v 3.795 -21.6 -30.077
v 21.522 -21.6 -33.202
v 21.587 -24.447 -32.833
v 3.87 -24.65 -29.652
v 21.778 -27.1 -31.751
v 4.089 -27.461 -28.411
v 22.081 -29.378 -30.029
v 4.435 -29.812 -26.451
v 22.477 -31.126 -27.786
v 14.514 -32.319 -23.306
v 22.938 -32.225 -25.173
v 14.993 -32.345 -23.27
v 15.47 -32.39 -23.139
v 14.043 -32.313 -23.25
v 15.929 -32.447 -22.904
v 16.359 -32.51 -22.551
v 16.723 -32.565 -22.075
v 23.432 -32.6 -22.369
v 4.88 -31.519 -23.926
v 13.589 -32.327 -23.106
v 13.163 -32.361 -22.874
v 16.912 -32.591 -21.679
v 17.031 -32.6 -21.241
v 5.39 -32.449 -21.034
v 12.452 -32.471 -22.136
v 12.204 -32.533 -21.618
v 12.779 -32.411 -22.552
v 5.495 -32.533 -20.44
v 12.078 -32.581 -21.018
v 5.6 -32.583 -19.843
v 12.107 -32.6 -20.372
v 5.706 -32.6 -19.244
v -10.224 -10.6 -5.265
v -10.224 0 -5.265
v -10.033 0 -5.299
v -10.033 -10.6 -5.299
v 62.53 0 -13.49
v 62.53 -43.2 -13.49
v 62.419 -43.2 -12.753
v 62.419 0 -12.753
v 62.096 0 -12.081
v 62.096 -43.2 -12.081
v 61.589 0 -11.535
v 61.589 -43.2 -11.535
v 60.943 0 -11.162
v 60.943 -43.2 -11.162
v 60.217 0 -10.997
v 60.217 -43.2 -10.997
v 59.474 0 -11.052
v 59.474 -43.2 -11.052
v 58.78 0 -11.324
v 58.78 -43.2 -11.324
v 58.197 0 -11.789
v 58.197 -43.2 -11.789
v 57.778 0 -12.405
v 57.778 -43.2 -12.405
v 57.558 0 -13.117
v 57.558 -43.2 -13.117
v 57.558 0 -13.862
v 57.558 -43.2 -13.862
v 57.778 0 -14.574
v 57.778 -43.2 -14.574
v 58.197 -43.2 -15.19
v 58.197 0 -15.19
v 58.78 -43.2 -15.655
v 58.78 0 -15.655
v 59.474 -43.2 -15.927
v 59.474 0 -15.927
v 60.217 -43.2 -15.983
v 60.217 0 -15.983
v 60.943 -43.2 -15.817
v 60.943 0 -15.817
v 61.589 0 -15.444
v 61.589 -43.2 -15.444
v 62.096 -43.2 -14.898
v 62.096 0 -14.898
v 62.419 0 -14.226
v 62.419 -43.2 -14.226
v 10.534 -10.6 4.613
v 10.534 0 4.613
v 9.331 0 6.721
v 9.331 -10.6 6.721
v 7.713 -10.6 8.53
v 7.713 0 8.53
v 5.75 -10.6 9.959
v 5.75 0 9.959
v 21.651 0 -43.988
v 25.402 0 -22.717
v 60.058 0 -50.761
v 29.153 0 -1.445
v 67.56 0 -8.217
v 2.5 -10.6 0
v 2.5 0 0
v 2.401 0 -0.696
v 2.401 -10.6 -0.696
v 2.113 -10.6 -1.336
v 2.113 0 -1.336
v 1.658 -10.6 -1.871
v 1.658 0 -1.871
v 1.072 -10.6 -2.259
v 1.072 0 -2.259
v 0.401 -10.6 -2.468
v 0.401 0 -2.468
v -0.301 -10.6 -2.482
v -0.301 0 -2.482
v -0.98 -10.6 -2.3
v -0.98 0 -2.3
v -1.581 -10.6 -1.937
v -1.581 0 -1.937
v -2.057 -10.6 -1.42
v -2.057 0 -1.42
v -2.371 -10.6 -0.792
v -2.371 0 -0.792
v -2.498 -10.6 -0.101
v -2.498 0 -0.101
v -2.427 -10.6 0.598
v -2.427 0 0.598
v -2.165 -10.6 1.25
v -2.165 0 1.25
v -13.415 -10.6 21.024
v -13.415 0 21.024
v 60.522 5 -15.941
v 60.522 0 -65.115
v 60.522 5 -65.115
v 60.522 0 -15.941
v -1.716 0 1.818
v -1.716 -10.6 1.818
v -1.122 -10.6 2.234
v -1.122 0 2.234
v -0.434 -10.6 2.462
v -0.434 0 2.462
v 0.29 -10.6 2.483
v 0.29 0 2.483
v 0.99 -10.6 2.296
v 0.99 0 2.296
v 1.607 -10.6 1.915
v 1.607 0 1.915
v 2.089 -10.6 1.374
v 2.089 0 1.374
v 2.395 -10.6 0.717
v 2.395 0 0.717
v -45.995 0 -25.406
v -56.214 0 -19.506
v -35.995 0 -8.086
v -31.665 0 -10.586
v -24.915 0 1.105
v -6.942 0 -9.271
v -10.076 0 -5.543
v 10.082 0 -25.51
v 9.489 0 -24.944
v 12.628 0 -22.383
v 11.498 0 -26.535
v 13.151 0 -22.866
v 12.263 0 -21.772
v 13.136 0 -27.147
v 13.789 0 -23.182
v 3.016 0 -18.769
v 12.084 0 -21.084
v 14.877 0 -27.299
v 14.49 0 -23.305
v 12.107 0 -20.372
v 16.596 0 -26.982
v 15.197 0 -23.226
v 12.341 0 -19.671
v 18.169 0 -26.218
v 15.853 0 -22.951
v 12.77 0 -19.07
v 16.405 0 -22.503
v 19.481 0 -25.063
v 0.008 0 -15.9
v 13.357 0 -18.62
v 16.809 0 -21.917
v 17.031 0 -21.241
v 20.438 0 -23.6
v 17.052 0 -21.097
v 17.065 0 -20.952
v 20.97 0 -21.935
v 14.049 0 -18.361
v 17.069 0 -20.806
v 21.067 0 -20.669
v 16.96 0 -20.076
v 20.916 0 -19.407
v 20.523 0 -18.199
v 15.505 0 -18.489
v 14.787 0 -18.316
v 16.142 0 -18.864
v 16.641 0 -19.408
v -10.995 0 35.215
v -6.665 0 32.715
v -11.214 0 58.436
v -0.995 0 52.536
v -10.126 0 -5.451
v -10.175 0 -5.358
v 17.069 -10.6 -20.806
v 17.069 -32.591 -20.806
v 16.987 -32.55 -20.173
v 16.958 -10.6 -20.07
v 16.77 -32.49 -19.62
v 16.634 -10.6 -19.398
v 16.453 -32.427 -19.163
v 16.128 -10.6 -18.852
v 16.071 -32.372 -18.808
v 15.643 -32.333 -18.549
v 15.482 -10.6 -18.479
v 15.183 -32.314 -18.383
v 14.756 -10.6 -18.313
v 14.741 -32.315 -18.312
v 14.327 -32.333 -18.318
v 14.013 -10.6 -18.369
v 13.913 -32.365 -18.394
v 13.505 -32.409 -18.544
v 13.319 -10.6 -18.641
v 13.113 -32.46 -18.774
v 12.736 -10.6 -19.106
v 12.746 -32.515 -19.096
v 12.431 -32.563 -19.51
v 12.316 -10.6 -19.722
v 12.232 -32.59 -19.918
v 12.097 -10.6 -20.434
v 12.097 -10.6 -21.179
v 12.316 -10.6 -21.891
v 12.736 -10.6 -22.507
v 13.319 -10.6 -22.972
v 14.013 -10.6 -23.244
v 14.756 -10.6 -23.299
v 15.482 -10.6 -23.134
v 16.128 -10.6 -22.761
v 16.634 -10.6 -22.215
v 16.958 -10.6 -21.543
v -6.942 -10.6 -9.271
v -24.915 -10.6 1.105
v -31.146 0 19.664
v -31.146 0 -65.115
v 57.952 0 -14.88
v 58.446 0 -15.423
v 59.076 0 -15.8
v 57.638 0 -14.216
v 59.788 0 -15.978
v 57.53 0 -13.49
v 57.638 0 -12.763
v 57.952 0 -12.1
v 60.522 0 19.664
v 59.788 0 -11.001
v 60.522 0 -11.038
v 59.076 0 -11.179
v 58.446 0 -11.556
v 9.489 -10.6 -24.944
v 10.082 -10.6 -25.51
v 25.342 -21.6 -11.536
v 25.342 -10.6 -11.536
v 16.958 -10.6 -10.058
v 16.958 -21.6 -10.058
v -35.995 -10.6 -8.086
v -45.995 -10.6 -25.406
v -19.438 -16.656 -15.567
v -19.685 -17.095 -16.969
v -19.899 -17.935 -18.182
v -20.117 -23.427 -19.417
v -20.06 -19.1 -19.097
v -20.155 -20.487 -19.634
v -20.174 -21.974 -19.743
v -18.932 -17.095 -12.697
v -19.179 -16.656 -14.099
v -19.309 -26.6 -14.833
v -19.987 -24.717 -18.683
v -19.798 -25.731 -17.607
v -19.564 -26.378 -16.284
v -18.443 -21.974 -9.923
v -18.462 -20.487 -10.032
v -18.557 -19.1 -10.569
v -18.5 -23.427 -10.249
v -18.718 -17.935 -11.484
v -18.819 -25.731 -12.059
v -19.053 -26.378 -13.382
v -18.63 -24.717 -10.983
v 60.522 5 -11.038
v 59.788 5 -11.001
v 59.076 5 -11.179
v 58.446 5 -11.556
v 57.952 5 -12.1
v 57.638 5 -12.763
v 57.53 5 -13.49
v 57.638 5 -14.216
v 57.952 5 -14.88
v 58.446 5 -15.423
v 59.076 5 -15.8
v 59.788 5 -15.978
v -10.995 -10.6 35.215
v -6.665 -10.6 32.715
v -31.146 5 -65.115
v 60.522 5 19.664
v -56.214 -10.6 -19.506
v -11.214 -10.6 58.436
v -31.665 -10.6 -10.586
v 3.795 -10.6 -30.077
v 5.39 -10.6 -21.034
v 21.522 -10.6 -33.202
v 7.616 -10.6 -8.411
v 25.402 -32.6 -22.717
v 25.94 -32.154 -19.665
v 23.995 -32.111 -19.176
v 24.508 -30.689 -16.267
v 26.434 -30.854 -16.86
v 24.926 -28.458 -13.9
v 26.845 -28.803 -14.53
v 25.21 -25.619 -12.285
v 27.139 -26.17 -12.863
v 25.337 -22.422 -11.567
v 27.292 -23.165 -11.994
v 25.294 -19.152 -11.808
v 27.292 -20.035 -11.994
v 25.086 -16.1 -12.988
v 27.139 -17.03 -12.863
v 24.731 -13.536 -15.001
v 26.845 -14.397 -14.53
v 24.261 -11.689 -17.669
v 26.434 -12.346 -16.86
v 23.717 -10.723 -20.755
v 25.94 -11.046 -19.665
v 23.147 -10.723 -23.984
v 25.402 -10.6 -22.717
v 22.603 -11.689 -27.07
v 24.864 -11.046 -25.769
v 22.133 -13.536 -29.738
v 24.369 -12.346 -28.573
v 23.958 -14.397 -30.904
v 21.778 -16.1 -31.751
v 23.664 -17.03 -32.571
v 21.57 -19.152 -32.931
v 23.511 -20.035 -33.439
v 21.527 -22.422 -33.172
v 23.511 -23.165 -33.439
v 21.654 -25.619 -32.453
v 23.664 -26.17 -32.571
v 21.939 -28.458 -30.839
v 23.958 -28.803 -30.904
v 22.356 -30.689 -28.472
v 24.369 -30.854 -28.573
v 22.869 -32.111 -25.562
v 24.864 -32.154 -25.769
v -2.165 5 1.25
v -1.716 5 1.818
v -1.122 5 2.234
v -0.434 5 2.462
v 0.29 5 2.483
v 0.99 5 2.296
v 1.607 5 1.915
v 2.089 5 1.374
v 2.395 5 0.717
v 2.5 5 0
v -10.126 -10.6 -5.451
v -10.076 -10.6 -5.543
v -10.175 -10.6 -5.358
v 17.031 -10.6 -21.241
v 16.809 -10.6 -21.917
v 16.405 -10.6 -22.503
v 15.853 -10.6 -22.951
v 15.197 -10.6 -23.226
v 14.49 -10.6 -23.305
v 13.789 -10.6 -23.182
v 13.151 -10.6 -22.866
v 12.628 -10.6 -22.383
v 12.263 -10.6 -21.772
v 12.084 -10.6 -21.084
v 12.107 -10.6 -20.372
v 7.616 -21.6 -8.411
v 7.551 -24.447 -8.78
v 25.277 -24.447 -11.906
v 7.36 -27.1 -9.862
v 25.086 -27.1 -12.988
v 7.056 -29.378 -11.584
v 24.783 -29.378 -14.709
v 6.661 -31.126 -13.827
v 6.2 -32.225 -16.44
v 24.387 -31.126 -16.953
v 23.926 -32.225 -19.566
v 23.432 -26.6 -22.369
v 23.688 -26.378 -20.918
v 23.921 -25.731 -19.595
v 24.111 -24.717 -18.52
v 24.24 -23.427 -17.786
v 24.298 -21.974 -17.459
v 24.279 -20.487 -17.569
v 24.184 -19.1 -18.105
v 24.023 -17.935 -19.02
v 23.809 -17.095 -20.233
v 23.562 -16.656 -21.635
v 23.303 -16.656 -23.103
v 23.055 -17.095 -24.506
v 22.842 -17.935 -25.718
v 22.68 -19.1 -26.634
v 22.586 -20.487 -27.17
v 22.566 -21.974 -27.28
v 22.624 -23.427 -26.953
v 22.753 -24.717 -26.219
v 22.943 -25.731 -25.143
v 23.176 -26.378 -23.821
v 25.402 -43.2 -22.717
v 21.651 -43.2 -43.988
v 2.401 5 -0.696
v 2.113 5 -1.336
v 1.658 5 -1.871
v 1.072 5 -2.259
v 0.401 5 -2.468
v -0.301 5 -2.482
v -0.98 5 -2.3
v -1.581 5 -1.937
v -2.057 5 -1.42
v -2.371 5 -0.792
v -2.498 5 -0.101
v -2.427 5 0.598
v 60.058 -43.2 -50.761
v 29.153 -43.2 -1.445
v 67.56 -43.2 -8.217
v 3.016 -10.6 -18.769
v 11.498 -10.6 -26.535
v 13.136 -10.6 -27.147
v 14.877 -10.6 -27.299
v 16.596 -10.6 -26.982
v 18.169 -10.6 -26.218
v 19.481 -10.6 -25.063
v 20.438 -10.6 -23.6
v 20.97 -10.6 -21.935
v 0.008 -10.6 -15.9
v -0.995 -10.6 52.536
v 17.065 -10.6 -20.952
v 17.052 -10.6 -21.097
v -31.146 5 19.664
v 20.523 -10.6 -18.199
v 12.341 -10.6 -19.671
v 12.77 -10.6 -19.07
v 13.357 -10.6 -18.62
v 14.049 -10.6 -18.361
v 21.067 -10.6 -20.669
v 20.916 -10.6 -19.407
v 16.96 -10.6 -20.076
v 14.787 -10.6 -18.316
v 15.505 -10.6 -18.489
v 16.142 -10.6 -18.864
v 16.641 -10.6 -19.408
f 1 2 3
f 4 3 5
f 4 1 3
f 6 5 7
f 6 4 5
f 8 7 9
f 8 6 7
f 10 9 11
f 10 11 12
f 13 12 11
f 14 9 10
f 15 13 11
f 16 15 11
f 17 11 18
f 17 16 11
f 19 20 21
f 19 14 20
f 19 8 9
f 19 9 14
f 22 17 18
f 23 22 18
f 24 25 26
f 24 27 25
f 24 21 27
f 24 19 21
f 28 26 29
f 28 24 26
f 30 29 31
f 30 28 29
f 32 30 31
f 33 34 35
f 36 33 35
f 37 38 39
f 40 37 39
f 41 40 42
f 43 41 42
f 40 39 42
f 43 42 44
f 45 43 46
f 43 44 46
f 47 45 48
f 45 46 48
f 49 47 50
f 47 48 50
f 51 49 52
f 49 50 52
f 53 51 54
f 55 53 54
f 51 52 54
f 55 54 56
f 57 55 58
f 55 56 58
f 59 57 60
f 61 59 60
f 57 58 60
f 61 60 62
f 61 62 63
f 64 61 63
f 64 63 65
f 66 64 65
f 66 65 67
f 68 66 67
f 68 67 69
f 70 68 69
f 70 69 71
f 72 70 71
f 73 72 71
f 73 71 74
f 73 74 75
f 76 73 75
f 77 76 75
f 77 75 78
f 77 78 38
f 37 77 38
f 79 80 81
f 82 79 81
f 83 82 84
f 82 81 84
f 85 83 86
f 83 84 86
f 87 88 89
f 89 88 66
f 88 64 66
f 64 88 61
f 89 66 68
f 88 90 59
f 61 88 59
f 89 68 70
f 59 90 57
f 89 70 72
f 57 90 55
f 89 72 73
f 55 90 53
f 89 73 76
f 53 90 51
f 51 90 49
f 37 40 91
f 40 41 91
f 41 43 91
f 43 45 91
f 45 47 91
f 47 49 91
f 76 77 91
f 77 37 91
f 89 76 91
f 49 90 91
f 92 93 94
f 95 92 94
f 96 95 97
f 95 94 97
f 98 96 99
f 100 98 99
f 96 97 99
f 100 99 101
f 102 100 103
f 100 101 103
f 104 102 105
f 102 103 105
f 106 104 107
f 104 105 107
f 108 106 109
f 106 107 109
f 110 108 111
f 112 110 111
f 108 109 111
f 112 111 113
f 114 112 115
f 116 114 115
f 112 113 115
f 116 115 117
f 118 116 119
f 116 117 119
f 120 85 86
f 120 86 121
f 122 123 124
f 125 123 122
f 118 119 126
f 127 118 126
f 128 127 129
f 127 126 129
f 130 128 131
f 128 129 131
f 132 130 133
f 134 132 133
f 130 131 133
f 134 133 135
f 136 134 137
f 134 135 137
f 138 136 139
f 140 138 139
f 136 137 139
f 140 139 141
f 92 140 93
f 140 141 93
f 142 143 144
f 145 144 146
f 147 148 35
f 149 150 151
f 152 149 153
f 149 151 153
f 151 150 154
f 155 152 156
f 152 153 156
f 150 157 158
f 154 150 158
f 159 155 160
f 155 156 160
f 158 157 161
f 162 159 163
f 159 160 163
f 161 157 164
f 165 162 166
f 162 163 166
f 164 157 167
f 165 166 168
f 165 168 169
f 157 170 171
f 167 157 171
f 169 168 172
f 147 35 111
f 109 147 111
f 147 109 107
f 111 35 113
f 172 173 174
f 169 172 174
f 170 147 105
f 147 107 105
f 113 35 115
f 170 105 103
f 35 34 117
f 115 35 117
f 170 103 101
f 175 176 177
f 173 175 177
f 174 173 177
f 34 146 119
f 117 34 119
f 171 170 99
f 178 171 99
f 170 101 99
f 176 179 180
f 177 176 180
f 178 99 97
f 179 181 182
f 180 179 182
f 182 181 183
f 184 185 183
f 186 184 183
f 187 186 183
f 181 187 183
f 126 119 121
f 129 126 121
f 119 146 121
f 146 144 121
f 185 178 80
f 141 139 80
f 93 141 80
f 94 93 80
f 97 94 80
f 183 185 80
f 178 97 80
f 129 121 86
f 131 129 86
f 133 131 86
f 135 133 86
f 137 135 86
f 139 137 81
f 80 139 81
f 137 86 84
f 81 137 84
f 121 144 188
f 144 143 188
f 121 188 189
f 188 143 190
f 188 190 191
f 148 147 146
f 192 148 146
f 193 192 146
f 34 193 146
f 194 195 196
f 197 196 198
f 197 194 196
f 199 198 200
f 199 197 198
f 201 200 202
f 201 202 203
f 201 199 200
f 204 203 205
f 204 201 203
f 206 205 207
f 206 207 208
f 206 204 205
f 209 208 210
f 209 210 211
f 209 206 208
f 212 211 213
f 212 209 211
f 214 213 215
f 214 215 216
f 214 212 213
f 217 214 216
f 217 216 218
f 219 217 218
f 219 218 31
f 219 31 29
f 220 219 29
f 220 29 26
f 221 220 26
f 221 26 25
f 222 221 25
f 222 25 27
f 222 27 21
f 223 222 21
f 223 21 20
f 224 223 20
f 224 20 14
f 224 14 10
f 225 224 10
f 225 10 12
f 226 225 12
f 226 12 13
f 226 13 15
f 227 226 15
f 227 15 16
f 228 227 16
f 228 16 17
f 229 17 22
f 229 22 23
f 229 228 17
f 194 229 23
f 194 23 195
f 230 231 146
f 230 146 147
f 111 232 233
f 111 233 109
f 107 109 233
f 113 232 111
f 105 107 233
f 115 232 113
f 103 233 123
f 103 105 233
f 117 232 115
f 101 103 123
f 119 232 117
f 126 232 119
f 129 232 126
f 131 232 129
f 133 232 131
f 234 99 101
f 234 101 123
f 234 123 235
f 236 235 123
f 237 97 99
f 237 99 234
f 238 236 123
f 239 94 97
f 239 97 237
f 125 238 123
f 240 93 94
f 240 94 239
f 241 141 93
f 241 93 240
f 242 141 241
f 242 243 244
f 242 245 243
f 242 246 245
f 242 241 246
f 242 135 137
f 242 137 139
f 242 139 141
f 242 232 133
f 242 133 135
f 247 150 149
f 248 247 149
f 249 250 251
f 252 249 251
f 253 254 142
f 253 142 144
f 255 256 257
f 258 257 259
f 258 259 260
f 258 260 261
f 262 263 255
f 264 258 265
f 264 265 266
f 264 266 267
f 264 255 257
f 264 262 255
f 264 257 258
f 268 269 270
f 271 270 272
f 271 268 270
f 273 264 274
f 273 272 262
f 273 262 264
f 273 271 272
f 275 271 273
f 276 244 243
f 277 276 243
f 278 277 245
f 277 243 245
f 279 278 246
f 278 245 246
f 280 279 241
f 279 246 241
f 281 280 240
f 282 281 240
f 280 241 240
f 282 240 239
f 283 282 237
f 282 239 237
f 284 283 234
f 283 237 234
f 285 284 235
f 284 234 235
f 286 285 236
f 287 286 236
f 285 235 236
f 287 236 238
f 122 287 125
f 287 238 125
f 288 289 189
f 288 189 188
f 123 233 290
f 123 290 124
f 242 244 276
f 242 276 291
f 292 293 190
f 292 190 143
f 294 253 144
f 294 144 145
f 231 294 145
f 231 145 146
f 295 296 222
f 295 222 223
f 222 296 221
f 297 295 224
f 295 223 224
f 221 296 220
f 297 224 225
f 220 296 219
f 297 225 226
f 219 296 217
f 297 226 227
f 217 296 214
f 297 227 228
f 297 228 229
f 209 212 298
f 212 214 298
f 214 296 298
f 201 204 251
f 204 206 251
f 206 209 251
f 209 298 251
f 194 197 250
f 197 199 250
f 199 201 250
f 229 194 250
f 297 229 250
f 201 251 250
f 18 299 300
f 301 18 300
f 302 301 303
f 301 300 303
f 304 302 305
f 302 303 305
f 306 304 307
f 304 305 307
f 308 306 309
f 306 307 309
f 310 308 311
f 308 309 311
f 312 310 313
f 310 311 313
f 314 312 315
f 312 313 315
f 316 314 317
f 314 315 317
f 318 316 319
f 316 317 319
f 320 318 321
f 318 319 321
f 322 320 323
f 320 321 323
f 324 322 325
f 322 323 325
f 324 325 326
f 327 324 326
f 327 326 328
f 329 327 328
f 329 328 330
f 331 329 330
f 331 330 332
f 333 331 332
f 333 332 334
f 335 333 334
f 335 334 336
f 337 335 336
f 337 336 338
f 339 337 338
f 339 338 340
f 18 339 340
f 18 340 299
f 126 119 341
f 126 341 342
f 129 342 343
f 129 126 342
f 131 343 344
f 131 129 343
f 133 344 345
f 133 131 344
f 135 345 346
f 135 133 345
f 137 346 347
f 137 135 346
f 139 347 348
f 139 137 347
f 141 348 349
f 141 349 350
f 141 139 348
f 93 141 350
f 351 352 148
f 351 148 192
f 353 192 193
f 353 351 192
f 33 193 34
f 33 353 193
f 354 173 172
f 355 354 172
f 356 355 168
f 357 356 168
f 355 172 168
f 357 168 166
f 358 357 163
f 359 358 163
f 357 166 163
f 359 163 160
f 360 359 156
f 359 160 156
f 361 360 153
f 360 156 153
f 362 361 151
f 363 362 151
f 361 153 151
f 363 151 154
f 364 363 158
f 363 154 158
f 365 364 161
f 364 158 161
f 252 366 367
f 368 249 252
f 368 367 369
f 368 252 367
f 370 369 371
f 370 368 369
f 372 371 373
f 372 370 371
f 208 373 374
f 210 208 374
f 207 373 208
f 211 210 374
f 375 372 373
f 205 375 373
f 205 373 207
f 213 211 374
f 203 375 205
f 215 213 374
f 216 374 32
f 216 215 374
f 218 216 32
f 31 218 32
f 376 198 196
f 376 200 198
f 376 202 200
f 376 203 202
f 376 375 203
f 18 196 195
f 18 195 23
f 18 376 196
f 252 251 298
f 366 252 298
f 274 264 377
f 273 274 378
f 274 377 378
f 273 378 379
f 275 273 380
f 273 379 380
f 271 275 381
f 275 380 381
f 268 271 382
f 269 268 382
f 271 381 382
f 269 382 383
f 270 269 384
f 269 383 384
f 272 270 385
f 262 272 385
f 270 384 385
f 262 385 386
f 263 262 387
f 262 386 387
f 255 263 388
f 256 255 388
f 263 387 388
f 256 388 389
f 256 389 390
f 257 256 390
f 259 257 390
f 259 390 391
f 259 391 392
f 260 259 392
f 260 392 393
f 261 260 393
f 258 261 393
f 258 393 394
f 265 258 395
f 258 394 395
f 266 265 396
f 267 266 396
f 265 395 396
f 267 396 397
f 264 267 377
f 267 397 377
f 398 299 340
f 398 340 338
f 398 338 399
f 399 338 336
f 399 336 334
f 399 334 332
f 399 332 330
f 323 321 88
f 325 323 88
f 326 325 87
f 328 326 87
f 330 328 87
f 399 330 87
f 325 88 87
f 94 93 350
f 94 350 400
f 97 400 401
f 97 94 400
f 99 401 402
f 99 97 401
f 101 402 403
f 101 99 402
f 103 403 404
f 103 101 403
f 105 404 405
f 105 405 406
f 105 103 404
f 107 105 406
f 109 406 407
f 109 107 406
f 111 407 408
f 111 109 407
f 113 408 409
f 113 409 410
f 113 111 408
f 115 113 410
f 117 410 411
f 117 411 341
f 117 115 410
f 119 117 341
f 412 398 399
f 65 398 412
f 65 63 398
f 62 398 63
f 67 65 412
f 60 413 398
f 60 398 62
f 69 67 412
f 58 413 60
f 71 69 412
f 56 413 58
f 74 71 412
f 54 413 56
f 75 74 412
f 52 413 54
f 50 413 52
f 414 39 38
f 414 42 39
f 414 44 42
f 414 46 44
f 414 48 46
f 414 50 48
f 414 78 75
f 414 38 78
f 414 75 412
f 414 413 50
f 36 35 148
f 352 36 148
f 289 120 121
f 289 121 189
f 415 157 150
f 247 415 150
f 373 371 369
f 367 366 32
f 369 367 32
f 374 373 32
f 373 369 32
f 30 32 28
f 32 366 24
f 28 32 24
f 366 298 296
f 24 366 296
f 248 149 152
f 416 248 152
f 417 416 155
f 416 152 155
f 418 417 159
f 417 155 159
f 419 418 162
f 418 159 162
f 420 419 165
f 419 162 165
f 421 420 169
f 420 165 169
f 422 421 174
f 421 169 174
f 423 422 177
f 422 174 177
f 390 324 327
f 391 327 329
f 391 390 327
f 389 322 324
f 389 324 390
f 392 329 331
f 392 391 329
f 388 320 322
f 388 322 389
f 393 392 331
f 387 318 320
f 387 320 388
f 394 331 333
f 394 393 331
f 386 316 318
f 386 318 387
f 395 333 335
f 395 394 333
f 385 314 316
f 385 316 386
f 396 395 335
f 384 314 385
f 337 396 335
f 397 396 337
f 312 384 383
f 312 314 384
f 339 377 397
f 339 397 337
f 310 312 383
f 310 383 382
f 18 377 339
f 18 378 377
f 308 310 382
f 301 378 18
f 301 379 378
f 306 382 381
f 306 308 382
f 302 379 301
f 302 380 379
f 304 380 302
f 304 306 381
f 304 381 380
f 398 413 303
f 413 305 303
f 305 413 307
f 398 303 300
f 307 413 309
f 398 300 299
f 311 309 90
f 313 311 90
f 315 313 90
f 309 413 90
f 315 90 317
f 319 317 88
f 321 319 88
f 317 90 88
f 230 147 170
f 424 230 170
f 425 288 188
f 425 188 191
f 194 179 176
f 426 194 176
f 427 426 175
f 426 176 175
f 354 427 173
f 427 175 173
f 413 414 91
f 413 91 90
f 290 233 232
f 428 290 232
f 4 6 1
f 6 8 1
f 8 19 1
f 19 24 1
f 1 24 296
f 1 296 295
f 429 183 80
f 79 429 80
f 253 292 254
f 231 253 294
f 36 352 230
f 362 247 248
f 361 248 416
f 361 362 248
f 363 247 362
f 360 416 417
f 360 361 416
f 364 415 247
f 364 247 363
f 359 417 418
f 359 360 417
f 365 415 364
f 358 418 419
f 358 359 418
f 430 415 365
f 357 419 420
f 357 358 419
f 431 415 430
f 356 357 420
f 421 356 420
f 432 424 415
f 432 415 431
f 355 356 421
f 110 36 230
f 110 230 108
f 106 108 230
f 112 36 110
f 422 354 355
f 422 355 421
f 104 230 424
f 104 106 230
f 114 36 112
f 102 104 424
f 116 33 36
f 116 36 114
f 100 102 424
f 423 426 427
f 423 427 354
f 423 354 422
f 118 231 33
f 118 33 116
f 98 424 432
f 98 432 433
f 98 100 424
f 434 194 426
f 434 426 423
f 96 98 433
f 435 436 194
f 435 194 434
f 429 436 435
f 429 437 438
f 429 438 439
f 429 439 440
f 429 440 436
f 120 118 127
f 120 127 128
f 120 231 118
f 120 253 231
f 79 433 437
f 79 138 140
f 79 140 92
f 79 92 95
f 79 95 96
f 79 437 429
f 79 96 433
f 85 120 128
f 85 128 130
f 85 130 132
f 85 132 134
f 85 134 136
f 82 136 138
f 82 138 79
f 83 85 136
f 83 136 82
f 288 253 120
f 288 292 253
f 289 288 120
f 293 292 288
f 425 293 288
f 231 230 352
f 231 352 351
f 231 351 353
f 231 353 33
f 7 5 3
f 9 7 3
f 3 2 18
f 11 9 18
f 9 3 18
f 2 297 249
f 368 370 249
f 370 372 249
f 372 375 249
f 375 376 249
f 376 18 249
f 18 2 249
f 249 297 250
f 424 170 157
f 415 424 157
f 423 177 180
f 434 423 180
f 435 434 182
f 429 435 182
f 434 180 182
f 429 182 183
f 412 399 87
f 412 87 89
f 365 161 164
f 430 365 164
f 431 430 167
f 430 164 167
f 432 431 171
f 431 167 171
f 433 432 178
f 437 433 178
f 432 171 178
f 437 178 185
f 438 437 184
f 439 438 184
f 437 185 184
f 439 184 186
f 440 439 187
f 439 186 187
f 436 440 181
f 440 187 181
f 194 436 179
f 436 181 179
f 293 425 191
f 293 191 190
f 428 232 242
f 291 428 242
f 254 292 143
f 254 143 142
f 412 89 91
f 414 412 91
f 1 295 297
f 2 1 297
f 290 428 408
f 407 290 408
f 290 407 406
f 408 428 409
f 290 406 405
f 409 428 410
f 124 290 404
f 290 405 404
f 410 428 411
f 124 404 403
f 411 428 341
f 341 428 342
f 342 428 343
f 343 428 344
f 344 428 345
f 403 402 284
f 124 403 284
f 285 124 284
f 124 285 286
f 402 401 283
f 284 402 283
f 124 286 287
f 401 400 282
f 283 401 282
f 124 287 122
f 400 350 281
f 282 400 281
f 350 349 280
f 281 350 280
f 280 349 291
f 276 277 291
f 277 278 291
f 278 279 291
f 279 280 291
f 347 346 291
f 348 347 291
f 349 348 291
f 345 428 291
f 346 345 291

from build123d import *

# Parameters (mm, degrees)
F1_DEPTH    = 10.6
F2_DEPTH    = 43.2
F3_R        = 11
F4_DEPTH    = 2
F5_R        = 5
F6_DEPTH    = 43.4
F7_R        = 2.5
F8_DEPTH    = 22
F9_T1_DEPTH = 73
F9_T3_DEPTH = 73
F10_W       = 91.6676837951
F10_H       = 84.7782492638
F11_DEPTH   = 5
F12_R       = 2.5
F13_DEPTH   = 74.8
F15_DEPTH   = 10.6


# Not quite as in the source:
# - a fillet or chamfer that OpenCascade refuses, or shapes differently, is made with other operations: its cross-section is extruded or revolved along the edge and cut away or added
# - a feature of the source that left no trace in its solid (it failed there, or was rolled back) is left out
# - a feature names something its author has since deleted; it is built from what else it names


with BuildPart() as f1:
    # F0 (on Front) → F1 (new body)
    with BuildSketch(Plane.XZ):
        with BuildLine():
            Line((20.5230552312, -18.1992913043), (10.5343781692, 4.6126864827))
            ThreePointArc((10.5343781692, 4.6126864827), (0.6372216988, 11.4823320152), (-9.9592921435, 5.75))
            ThreePointArc((-9.9592921435, 5.75), (-11.496683076, 0.276185173), (-10.2239091523, -5.2651383312))
            Line((-10.2239091523, -5.2651383312), (-10.0330621935, -5.2987897992))
            Line((-10.0330621935, -5.2987897992), (-10.0760856471, -5.5427879295))
            ThreePointArc((-10.0760856471, -5.5427879295), (-9.1133059009, -7.0141040451), (-7.937476981, -8.3214457383))
            Line((-7.937476981, -8.3214457383), (0.0076867142, -15.9000031098))
            ThreePointArc((0.0076867142, -15.9000031098), (4.1721880916, -16.865197921), (7.4918654025, -19.5586001001))
            Line((7.4918654025, -19.5586001001), (12.1068221008, -20.3723414808))
            ThreePointArc((12.1068221008, -20.3723414808), (14.7867308402, -18.3159751797), (17.0688414833, -20.8064619249))
            ThreePointArc((17.0688414833, -20.8064619249), (17.0593282285, -21.0243512818), (17.0308608658, -21.2405823691))
            Line((17.0308608658, -21.2405823691), (20.9700918779, -21.9351750798))
            ThreePointArc((20.9700918779, -21.9351750798), (21.0227999926, -20.0341798777), (20.5230552312, -18.1992913043))
        make_face()
        with BuildLine():
            ThreePointArc((2.5, 0), (-0.6470476128, -2.4148145657), (-2.1650635095, 1.25))
            ThreePointArc((-2.1650635095, 1.25), (0.6470476128, 2.4148145657), (2.5, 0))
        make_face(mode=Mode.SUBTRACT)
        with BuildLine():
            ThreePointArc((10.0824414506, -25.509887777), (16.5964769767, -26.9821152755), (20.9700918779, -21.9351750798))
            Line((20.9700918779, -21.9351750798), (17.0308608658, -21.2405823691))
            ThreePointArc((17.0308608658, -21.2405823691), (14.1347210391, -23.2684813075), (12.1068221008, -20.3723414808))
            Line((12.1068221008, -20.3723414808), (7.4918654025, -19.5586001001))
            ThreePointArc((7.4918654025, -19.5586001001), (8.9071937501, -22.0966835606), (9.4890434601, -24.9438704))
            Line((9.4890434601, -24.9438704), (10.0824414506, -25.509887777))
        make_face()
        with BuildLine():
            Line((3.0158426859, -18.7693565289), (9.4890434601, -24.9438704))
            ThreePointArc((9.4890434601, -24.9438704), (8.9071937501, -22.0966835606), (7.4918654025, -19.5586001001))
            Line((7.4918654025, -19.5586001001), (3.0158426859, -18.7693565289))
        make_face()
        with BuildLine():
            ThreePointArc((7.4918654025, -19.5586001001), (4.1721880916, -16.865197921), (0.0076867142, -15.9000031098))
            Line((0.0076867142, -15.9000031098), (3.0158426859, -18.7693565289))
            Line((3.0158426859, -18.7693565289), (7.4918654025, -19.5586001001))
        make_face()
    extrude(amount=F1_DEPTH)

    # F14 (on face) → F15 (join)
    with BuildSketch(Plane.XZ.offset(10.6)):
        with BuildLine():
            Line((-31.664557856, -10.5859724576), (-24.914557856, 1.1053704935))
            Line((-24.914557856, 1.1053704935), (-6.941731015, -9.2712459212))
            Line((-6.941731015, -9.2712459212), (-7.937476981, -8.3214457383))
            ThreePointArc((-7.937476981, -8.3214457383), (-9.1133059009, -7.0141040451), (-10.0760856471, -5.5427879295))
            ThreePointArc((-10.0760856471, -5.5427879295), (-10.1509467311, -5.4044685642), (-10.2239091523, -5.2651383312))
            ThreePointArc((-10.2239091523, -5.2651383312), (-11.496683076, 0.276185173), (-9.9592921435, 5.75))
            Line((-9.9592921435, 5.75), (-23.4946848749, 13.564662637))
            Line((-23.4946848749, 13.564662637), (-35.9946848749, -8.0859724576))
            Line((-35.9946848749, -8.0859724576), (-31.664557856, -10.5859724576))
        make_face()
        with BuildLine():
            Line((-17.7446848749, 23.5239547806), (-23.4946848749, 13.564662637))
            Line((-23.4946848749, 13.564662637), (-9.9592921435, 5.75))
            ThreePointArc((-9.9592921435, 5.75), (-2.9764190187, 11.1081470023), (5.75, 9.9592921435))
            Line((5.75, 9.9592921435), (-13.414557856, 21.0239547806))
            Line((-13.414557856, 21.0239547806), (-6.664557856, 32.7152977317))
            Line((-6.664557856, 32.7152977317), (-10.9946848749, 35.2152977317))
            Line((-10.9946848749, 35.2152977317), (-17.7446848749, 23.5239547806))
        make_face()
        Polygon((-41.6238499995, -4.8359724576), (-35.9946848749, -8.0859724576), (-23.4946848749, 13.564662637), (-17.7446848749, 23.5239547806), (-10.9946848749, 35.2152977317), (-16.6238499995, 38.4652977317), align=None)
        Polygon((-45.9946848749, -25.4064805333), (-35.9946848749, -8.0859724576), (-41.6238499995, -4.8359724576), (-16.6238499995, 38.4652977317), (-10.9946848749, 35.2152977317), (-0.9946848749, 52.5358058073), (-11.2137846395, 58.4358058073), (-56.2137846395, -19.5064805333), align=None)
    extrude(amount=-F15_DEPTH)


with BuildPart() as f2:
    # F0 (on Front) → F2 (new body)
    with BuildSketch(Plane.XZ):
        Polygon((29.1525274041, -1.4447444142), (25.4017267665, -22.7165918793), (21.6509261288, -43.9884393443), (60.0584284963, -50.7607182734), (67.5600297715, -8.2170233432), align=None)
    extrude(amount=F2_DEPTH)

    # F3 (on face) → F4 (join)
    with BuildSketch(Plane(origin=(28.5205369873, 0, -5.0289401751), x_dir=(0, -1, 0), z_dir=(-0.984807753, 0, 0.1736481777))):
        with Locations((21.6, -17.9605122421)):
            Circle(F3_R)
    extrude(amount=F4_DEPTH)

    # F5 (on face) → F6 (join)
    with BuildSketch(Plane(origin=(26.5509214812, 0, -4.6816438198), x_dir=(0, -1, 0), z_dir=(-0.984807753, 0, 0.1736481777))):
        with Locations((21.6, -17.9605122421)):
            Circle(F5_R)
    extrude(amount=F6_DEPTH)


with BuildPart() as f8:
    # F7 (on face) → F8 (new body)
    with BuildSketch(Plane.XZ.offset(10.6)):
        with BuildLine():
            Line((3.7954417519, -30.0765136091), (21.5219813061, -33.2021808071))
            Line((21.5219813061, -33.2021808071), (25.3422412148, -11.5364102408))
            Line((25.3422412148, -11.5364102408), (16.9582685695, -10.0580896579))
            Line((16.9582685695, -10.0580896579), (20.5230552312, -18.1992913043))
            ThreePointArc((20.5230552312, -18.1992913043), (18.2970883196, -26.1309502128), (10.0824414506, -25.509887777))
            Line((10.0824414506, -25.509887777), (5.3899032629, -21.0338730293))
            Line((5.3899032629, -21.0338730293), (3.7954417519, -30.0765136091))
        make_face()
        with BuildLine():
            Line((20.5230552312, -18.1992913043), (16.9582685695, -10.0580896579))
            Line((16.9582685695, -10.0580896579), (7.6157016605, -8.4107430428))
            Line((7.6157016605, -8.4107430428), (5.3899032629, -21.0338730293))
            Line((5.3899032629, -21.0338730293), (10.0824414506, -25.509887777))
            ThreePointArc((10.0824414506, -25.509887777), (18.2970883196, -26.1309502128), (20.5230552312, -18.1992913043))
        make_face()
        with Locations((14.5688414833, -20.8064619249)):
            Circle(F7_R, mode=Mode.SUBTRACT)
    extrude(amount=F8_DEPTH)

    # F9: fillet of radius 11 on 2 edges, made by hand

    # F9_s2 → F9_t1 (cut)
    with BuildSketch(Plane(origin=(53.6331346891, 0, -9.4569687057), x_dir=(0, 1, 0), z_dir=(-0.984807753, 0, 0.1736481777))):
        with BuildLine():
            ThreePointArc((-21.6, 6.9605122421), (-29.3781745931, 10.1823376491), (-32.6, 17.9605122421))
            Line((-32.6, 17.9605122421), (-32.6, 6.9605122421))
            Line((-32.6, 6.9605122421), (-21.6, 6.9605122421))
        make_face()
    extrude(amount=F9_T1_DEPTH, mode=Mode.SUBTRACT)

    # F9_s4 → F9_t3 (cut)
    with BuildSketch(Plane(origin=(-18.2578312808, 0, 3.219348264), x_dir=(0, 1, 0), z_dir=(0.984807753, 0, -0.1736481777))):
        with BuildLine():
            ThreePointArc((-21.6, -28.9605122421), (-29.3781745931, -25.7386868352), (-32.6, -17.9605122421))
            Line((-32.6, -17.9605122421), (-32.6, -28.9605122421))
            Line((-32.6, -28.9605122421), (-21.6, -28.9605122421))
        make_face()
    extrude(amount=F9_T3_DEPTH, mode=Mode.SUBTRACT)


with BuildPart() as f11:
    # F10 (on face) → F11 (new body)
    with BuildSketch(Plane.XZ):
        with Locations((14.6878799424, -22.7255448699)):
            Rectangle(F10_W, F10_H)
        with BuildLine():
            Line((10.5343781692, 4.6126864827), (20.5230552312, -18.1992913043))
            ThreePointArc((20.5230552312, -18.1992913043), (21.0227999926, -20.0341798777), (20.9700918779, -21.9351750798))
            Line((20.9700918779, -21.9351750798), (17.0308608658, -21.2405823691))
            ThreePointArc((17.0308608658, -21.2405823691), (17.0593282285, -21.0243512818), (17.0688414833, -20.8064619249))
            ThreePointArc((17.0688414833, -20.8064619249), (14.7867308402, -18.3159751797), (12.1068221008, -20.3723414808))
            Line((12.1068221008, -20.3723414808), (7.4918654025, -19.5586001001))
            ThreePointArc((7.4918654025, -19.5586001001), (4.1721880916, -16.865197921), (0.0076867142, -15.9000031098))
            Line((0.0076867142, -15.9000031098), (-7.937476981, -8.3214457383))
            ThreePointArc((-7.937476981, -8.3214457383), (-9.1133059009, -7.0141040451), (-10.0760856471, -5.5427879295))
            Line((-10.0760856471, -5.5427879295), (-10.0330621935, -5.2987897992))
            Line((-10.0330621935, -5.2987897992), (-10.2239091523, -5.2651383312))
            ThreePointArc((-10.2239091523, -5.2651383312), (-11.496683076, 0.276185173), (-9.9592921435, 5.75))
            ThreePointArc((-9.9592921435, 5.75), (0.6372216988, 11.4823320152), (10.5343781692, 4.6126864827))
        make_face(mode=Mode.SUBTRACT)
    extrude(amount=-F11_DEPTH)

    # F0 (on Front) → F11, piece 2 (join)
    with BuildSketch(Plane.XZ):
        with BuildLine():
            Line((20.5230552312, -18.1992913043), (10.5343781692, 4.6126864827))
            ThreePointArc((10.5343781692, 4.6126864827), (0.6372216988, 11.4823320152), (-9.9592921435, 5.75))
            ThreePointArc((-9.9592921435, 5.75), (-11.496683076, 0.276185173), (-10.2239091523, -5.2651383312))
            Line((-10.2239091523, -5.2651383312), (-10.0330621935, -5.2987897992))
            Line((-10.0330621935, -5.2987897992), (-10.0760856471, -5.5427879295))
            ThreePointArc((-10.0760856471, -5.5427879295), (-9.1133059009, -7.0141040451), (-7.937476981, -8.3214457383))
            Line((-7.937476981, -8.3214457383), (0.0076867142, -15.9000031098))
            ThreePointArc((0.0076867142, -15.9000031098), (4.1721880916, -16.865197921), (7.4918654025, -19.5586001001))
            Line((7.4918654025, -19.5586001001), (12.1068221008, -20.3723414808))
            ThreePointArc((12.1068221008, -20.3723414808), (14.7867308402, -18.3159751797), (17.0688414833, -20.8064619249))
            ThreePointArc((17.0688414833, -20.8064619249), (17.0593282285, -21.0243512818), (17.0308608658, -21.2405823691))
            Line((17.0308608658, -21.2405823691), (20.9700918779, -21.9351750798))
            ThreePointArc((20.9700918779, -21.9351750798), (21.0227999926, -20.0341798777), (20.5230552312, -18.1992913043))
        make_face()
        with BuildLine():
            ThreePointArc((2.5, 0), (-0.6470476128, -2.4148145657), (-2.1650635095, 1.25))
            ThreePointArc((-2.1650635095, 1.25), (0.6470476128, 2.4148145657), (2.5, 0))
        make_face(mode=Mode.SUBTRACT)
        with BuildLine():
            ThreePointArc((12.1068221008, -20.3723414808), (14.1347210391, -23.2684813075), (17.0308608658, -21.2405823691))
            Line((17.0308608658, -21.2405823691), (12.1068221008, -20.3723414808))
        make_face()
        with BuildLine():
            Line((12.1068221008, -20.3723414808), (17.0308608658, -21.2405823691))
            ThreePointArc((17.0308608658, -21.2405823691), (17.0593282285, -21.0243512818), (17.0688414833, -20.8064619249))
            ThreePointArc((17.0688414833, -20.8064619249), (14.7867308402, -18.3159751797), (12.1068221008, -20.3723414808))
        make_face()
    extrude(amount=-F11_DEPTH)


with BuildPart() as f13_tool:
    # F12 (on face) → F13 (new body)
    with BuildSketch(Plane.XZ.offset(43.2)):
        with Locations((60.0300662221, -13.489560583)):
            Circle(F12_R)
    extrude(amount=-F13_DEPTH)


with BuildPart() as f2_1:
    add(f2.part)

    # F13: cut by f13_tool
    add(f13_tool.part, mode=Mode.SUBTRACT)


with BuildPart() as f11_1:
    add(f11.part)

    # F13: cut by f13_tool
    add(f13_tool.part, mode=Mode.SUBTRACT)


solid = Compound([f1.part, f8.part, f2_1.part, f11_1.part])
